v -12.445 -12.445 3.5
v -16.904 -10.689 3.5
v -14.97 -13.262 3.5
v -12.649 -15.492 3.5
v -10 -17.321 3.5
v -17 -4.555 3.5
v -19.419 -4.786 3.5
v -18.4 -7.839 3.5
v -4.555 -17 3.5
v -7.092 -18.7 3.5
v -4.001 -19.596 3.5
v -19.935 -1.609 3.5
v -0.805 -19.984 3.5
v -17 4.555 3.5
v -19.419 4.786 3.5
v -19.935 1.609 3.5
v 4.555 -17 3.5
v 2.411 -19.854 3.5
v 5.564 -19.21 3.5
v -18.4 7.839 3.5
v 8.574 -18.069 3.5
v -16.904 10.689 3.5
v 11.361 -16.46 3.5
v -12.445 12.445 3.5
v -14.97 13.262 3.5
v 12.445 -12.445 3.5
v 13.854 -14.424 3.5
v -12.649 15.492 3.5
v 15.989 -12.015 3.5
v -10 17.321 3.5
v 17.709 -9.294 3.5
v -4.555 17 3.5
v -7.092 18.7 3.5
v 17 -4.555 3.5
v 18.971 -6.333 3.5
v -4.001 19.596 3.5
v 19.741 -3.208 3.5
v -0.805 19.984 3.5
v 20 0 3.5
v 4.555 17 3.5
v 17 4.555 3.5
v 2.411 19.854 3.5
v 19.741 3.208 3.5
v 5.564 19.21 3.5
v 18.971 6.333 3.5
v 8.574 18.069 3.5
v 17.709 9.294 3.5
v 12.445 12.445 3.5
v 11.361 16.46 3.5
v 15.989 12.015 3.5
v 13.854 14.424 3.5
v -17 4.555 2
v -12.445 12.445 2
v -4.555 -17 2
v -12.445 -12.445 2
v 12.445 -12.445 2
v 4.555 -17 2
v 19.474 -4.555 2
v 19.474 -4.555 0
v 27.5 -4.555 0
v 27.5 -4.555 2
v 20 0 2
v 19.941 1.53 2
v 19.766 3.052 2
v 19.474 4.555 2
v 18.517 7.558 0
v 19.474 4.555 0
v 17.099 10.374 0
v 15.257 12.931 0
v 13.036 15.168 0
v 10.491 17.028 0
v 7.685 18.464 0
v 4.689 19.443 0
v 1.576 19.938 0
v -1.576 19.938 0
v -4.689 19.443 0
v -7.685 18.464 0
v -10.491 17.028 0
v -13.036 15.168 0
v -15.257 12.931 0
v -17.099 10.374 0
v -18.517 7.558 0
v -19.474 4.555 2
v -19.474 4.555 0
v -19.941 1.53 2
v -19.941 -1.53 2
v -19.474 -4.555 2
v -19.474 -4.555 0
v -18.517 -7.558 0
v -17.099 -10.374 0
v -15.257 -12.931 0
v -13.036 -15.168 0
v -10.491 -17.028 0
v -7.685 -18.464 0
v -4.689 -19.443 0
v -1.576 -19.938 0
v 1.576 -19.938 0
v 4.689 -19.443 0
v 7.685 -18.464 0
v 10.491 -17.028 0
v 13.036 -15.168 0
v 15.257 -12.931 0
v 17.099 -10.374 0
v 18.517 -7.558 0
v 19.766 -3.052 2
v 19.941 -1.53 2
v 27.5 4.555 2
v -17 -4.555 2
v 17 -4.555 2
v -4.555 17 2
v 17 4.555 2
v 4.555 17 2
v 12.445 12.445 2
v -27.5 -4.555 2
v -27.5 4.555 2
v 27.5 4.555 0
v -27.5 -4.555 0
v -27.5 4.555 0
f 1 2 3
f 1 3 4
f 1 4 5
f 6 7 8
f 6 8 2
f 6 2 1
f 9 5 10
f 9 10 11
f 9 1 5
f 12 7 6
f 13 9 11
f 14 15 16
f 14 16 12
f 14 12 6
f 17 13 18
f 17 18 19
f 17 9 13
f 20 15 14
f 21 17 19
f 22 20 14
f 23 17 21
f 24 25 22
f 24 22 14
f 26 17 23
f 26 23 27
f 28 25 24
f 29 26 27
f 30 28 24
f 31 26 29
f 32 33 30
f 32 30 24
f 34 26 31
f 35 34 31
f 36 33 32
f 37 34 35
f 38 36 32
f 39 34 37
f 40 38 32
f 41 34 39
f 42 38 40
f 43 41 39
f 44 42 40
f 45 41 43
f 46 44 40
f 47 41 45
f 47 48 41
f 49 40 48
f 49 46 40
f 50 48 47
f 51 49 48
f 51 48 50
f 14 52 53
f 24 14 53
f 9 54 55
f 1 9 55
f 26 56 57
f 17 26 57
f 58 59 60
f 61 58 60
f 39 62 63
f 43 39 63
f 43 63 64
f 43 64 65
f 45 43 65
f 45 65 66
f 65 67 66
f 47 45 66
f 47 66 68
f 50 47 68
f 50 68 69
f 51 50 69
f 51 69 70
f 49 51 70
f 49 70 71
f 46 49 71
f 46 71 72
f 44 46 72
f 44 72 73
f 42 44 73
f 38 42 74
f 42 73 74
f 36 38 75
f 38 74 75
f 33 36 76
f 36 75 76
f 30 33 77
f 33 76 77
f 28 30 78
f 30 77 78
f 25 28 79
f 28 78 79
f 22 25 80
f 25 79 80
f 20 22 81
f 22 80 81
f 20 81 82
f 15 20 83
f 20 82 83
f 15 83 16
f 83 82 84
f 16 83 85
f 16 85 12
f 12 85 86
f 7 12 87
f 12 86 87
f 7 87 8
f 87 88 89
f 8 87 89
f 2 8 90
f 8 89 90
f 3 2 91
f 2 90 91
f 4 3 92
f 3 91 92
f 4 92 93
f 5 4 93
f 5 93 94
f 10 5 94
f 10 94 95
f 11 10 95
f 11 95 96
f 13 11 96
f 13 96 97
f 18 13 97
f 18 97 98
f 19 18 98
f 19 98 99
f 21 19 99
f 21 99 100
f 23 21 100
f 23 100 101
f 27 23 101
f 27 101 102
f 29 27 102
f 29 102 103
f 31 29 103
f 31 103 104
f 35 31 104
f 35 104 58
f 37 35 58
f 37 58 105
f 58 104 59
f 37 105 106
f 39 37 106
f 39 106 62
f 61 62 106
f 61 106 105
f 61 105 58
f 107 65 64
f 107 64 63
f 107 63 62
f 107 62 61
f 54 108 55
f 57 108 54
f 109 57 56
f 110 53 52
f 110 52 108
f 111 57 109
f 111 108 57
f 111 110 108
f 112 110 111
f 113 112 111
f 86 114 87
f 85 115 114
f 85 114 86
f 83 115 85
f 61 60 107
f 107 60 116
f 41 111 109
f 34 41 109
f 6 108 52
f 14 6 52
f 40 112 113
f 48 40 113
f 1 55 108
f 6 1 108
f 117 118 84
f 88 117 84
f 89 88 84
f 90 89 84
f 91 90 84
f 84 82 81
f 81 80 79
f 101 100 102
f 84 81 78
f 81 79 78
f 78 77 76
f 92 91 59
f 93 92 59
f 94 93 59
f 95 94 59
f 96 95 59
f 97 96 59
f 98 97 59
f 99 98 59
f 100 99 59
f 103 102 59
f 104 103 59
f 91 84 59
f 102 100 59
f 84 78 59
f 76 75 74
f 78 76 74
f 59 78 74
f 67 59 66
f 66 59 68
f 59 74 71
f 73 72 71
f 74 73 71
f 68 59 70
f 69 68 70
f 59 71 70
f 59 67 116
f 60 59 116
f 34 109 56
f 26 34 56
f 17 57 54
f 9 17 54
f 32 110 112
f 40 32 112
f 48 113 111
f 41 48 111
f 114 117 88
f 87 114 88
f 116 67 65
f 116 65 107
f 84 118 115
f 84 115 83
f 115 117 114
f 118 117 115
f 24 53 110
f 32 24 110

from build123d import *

# Parameters (mm, degrees)
F0_R     = 20
F1_DEPTH = 3.5
F3_R     = 20
F4_DEPTH = 2
F5_W     = 55
F5_H     = 9.110272
F6_DEPTH = 2


with BuildPart() as f1:
    # F0 (on Top) → F1 (new body)
    with BuildSketch(Plane.XY):
        Circle(F0_R)
        Polygon((-12.444864, 12.444864), (-4.555136, 17), (4.555136, 17), (12.444864, 12.444864), (17, 4.555136), (17, -4.555136), (12.444864, -12.444864), (4.555136, -17), (-4.555136, -17), (-12.444864, -12.444864), (-17, -4.555136), (-17, 4.555136), align=None, mode=Mode.SUBTRACT)
    extrude(amount=F1_DEPTH)

    # F3 (on Top) → F4 (join)
    with BuildSketch(Plane.XY):
        Circle(F3_R)
    extrude(amount=F4_DEPTH)

    # F5 (on Top) → F6 (join)
    with BuildSketch(Plane.XY):
        Rectangle(F5_W, F5_H)
    extrude(amount=F6_DEPTH)


solid = f1.part
